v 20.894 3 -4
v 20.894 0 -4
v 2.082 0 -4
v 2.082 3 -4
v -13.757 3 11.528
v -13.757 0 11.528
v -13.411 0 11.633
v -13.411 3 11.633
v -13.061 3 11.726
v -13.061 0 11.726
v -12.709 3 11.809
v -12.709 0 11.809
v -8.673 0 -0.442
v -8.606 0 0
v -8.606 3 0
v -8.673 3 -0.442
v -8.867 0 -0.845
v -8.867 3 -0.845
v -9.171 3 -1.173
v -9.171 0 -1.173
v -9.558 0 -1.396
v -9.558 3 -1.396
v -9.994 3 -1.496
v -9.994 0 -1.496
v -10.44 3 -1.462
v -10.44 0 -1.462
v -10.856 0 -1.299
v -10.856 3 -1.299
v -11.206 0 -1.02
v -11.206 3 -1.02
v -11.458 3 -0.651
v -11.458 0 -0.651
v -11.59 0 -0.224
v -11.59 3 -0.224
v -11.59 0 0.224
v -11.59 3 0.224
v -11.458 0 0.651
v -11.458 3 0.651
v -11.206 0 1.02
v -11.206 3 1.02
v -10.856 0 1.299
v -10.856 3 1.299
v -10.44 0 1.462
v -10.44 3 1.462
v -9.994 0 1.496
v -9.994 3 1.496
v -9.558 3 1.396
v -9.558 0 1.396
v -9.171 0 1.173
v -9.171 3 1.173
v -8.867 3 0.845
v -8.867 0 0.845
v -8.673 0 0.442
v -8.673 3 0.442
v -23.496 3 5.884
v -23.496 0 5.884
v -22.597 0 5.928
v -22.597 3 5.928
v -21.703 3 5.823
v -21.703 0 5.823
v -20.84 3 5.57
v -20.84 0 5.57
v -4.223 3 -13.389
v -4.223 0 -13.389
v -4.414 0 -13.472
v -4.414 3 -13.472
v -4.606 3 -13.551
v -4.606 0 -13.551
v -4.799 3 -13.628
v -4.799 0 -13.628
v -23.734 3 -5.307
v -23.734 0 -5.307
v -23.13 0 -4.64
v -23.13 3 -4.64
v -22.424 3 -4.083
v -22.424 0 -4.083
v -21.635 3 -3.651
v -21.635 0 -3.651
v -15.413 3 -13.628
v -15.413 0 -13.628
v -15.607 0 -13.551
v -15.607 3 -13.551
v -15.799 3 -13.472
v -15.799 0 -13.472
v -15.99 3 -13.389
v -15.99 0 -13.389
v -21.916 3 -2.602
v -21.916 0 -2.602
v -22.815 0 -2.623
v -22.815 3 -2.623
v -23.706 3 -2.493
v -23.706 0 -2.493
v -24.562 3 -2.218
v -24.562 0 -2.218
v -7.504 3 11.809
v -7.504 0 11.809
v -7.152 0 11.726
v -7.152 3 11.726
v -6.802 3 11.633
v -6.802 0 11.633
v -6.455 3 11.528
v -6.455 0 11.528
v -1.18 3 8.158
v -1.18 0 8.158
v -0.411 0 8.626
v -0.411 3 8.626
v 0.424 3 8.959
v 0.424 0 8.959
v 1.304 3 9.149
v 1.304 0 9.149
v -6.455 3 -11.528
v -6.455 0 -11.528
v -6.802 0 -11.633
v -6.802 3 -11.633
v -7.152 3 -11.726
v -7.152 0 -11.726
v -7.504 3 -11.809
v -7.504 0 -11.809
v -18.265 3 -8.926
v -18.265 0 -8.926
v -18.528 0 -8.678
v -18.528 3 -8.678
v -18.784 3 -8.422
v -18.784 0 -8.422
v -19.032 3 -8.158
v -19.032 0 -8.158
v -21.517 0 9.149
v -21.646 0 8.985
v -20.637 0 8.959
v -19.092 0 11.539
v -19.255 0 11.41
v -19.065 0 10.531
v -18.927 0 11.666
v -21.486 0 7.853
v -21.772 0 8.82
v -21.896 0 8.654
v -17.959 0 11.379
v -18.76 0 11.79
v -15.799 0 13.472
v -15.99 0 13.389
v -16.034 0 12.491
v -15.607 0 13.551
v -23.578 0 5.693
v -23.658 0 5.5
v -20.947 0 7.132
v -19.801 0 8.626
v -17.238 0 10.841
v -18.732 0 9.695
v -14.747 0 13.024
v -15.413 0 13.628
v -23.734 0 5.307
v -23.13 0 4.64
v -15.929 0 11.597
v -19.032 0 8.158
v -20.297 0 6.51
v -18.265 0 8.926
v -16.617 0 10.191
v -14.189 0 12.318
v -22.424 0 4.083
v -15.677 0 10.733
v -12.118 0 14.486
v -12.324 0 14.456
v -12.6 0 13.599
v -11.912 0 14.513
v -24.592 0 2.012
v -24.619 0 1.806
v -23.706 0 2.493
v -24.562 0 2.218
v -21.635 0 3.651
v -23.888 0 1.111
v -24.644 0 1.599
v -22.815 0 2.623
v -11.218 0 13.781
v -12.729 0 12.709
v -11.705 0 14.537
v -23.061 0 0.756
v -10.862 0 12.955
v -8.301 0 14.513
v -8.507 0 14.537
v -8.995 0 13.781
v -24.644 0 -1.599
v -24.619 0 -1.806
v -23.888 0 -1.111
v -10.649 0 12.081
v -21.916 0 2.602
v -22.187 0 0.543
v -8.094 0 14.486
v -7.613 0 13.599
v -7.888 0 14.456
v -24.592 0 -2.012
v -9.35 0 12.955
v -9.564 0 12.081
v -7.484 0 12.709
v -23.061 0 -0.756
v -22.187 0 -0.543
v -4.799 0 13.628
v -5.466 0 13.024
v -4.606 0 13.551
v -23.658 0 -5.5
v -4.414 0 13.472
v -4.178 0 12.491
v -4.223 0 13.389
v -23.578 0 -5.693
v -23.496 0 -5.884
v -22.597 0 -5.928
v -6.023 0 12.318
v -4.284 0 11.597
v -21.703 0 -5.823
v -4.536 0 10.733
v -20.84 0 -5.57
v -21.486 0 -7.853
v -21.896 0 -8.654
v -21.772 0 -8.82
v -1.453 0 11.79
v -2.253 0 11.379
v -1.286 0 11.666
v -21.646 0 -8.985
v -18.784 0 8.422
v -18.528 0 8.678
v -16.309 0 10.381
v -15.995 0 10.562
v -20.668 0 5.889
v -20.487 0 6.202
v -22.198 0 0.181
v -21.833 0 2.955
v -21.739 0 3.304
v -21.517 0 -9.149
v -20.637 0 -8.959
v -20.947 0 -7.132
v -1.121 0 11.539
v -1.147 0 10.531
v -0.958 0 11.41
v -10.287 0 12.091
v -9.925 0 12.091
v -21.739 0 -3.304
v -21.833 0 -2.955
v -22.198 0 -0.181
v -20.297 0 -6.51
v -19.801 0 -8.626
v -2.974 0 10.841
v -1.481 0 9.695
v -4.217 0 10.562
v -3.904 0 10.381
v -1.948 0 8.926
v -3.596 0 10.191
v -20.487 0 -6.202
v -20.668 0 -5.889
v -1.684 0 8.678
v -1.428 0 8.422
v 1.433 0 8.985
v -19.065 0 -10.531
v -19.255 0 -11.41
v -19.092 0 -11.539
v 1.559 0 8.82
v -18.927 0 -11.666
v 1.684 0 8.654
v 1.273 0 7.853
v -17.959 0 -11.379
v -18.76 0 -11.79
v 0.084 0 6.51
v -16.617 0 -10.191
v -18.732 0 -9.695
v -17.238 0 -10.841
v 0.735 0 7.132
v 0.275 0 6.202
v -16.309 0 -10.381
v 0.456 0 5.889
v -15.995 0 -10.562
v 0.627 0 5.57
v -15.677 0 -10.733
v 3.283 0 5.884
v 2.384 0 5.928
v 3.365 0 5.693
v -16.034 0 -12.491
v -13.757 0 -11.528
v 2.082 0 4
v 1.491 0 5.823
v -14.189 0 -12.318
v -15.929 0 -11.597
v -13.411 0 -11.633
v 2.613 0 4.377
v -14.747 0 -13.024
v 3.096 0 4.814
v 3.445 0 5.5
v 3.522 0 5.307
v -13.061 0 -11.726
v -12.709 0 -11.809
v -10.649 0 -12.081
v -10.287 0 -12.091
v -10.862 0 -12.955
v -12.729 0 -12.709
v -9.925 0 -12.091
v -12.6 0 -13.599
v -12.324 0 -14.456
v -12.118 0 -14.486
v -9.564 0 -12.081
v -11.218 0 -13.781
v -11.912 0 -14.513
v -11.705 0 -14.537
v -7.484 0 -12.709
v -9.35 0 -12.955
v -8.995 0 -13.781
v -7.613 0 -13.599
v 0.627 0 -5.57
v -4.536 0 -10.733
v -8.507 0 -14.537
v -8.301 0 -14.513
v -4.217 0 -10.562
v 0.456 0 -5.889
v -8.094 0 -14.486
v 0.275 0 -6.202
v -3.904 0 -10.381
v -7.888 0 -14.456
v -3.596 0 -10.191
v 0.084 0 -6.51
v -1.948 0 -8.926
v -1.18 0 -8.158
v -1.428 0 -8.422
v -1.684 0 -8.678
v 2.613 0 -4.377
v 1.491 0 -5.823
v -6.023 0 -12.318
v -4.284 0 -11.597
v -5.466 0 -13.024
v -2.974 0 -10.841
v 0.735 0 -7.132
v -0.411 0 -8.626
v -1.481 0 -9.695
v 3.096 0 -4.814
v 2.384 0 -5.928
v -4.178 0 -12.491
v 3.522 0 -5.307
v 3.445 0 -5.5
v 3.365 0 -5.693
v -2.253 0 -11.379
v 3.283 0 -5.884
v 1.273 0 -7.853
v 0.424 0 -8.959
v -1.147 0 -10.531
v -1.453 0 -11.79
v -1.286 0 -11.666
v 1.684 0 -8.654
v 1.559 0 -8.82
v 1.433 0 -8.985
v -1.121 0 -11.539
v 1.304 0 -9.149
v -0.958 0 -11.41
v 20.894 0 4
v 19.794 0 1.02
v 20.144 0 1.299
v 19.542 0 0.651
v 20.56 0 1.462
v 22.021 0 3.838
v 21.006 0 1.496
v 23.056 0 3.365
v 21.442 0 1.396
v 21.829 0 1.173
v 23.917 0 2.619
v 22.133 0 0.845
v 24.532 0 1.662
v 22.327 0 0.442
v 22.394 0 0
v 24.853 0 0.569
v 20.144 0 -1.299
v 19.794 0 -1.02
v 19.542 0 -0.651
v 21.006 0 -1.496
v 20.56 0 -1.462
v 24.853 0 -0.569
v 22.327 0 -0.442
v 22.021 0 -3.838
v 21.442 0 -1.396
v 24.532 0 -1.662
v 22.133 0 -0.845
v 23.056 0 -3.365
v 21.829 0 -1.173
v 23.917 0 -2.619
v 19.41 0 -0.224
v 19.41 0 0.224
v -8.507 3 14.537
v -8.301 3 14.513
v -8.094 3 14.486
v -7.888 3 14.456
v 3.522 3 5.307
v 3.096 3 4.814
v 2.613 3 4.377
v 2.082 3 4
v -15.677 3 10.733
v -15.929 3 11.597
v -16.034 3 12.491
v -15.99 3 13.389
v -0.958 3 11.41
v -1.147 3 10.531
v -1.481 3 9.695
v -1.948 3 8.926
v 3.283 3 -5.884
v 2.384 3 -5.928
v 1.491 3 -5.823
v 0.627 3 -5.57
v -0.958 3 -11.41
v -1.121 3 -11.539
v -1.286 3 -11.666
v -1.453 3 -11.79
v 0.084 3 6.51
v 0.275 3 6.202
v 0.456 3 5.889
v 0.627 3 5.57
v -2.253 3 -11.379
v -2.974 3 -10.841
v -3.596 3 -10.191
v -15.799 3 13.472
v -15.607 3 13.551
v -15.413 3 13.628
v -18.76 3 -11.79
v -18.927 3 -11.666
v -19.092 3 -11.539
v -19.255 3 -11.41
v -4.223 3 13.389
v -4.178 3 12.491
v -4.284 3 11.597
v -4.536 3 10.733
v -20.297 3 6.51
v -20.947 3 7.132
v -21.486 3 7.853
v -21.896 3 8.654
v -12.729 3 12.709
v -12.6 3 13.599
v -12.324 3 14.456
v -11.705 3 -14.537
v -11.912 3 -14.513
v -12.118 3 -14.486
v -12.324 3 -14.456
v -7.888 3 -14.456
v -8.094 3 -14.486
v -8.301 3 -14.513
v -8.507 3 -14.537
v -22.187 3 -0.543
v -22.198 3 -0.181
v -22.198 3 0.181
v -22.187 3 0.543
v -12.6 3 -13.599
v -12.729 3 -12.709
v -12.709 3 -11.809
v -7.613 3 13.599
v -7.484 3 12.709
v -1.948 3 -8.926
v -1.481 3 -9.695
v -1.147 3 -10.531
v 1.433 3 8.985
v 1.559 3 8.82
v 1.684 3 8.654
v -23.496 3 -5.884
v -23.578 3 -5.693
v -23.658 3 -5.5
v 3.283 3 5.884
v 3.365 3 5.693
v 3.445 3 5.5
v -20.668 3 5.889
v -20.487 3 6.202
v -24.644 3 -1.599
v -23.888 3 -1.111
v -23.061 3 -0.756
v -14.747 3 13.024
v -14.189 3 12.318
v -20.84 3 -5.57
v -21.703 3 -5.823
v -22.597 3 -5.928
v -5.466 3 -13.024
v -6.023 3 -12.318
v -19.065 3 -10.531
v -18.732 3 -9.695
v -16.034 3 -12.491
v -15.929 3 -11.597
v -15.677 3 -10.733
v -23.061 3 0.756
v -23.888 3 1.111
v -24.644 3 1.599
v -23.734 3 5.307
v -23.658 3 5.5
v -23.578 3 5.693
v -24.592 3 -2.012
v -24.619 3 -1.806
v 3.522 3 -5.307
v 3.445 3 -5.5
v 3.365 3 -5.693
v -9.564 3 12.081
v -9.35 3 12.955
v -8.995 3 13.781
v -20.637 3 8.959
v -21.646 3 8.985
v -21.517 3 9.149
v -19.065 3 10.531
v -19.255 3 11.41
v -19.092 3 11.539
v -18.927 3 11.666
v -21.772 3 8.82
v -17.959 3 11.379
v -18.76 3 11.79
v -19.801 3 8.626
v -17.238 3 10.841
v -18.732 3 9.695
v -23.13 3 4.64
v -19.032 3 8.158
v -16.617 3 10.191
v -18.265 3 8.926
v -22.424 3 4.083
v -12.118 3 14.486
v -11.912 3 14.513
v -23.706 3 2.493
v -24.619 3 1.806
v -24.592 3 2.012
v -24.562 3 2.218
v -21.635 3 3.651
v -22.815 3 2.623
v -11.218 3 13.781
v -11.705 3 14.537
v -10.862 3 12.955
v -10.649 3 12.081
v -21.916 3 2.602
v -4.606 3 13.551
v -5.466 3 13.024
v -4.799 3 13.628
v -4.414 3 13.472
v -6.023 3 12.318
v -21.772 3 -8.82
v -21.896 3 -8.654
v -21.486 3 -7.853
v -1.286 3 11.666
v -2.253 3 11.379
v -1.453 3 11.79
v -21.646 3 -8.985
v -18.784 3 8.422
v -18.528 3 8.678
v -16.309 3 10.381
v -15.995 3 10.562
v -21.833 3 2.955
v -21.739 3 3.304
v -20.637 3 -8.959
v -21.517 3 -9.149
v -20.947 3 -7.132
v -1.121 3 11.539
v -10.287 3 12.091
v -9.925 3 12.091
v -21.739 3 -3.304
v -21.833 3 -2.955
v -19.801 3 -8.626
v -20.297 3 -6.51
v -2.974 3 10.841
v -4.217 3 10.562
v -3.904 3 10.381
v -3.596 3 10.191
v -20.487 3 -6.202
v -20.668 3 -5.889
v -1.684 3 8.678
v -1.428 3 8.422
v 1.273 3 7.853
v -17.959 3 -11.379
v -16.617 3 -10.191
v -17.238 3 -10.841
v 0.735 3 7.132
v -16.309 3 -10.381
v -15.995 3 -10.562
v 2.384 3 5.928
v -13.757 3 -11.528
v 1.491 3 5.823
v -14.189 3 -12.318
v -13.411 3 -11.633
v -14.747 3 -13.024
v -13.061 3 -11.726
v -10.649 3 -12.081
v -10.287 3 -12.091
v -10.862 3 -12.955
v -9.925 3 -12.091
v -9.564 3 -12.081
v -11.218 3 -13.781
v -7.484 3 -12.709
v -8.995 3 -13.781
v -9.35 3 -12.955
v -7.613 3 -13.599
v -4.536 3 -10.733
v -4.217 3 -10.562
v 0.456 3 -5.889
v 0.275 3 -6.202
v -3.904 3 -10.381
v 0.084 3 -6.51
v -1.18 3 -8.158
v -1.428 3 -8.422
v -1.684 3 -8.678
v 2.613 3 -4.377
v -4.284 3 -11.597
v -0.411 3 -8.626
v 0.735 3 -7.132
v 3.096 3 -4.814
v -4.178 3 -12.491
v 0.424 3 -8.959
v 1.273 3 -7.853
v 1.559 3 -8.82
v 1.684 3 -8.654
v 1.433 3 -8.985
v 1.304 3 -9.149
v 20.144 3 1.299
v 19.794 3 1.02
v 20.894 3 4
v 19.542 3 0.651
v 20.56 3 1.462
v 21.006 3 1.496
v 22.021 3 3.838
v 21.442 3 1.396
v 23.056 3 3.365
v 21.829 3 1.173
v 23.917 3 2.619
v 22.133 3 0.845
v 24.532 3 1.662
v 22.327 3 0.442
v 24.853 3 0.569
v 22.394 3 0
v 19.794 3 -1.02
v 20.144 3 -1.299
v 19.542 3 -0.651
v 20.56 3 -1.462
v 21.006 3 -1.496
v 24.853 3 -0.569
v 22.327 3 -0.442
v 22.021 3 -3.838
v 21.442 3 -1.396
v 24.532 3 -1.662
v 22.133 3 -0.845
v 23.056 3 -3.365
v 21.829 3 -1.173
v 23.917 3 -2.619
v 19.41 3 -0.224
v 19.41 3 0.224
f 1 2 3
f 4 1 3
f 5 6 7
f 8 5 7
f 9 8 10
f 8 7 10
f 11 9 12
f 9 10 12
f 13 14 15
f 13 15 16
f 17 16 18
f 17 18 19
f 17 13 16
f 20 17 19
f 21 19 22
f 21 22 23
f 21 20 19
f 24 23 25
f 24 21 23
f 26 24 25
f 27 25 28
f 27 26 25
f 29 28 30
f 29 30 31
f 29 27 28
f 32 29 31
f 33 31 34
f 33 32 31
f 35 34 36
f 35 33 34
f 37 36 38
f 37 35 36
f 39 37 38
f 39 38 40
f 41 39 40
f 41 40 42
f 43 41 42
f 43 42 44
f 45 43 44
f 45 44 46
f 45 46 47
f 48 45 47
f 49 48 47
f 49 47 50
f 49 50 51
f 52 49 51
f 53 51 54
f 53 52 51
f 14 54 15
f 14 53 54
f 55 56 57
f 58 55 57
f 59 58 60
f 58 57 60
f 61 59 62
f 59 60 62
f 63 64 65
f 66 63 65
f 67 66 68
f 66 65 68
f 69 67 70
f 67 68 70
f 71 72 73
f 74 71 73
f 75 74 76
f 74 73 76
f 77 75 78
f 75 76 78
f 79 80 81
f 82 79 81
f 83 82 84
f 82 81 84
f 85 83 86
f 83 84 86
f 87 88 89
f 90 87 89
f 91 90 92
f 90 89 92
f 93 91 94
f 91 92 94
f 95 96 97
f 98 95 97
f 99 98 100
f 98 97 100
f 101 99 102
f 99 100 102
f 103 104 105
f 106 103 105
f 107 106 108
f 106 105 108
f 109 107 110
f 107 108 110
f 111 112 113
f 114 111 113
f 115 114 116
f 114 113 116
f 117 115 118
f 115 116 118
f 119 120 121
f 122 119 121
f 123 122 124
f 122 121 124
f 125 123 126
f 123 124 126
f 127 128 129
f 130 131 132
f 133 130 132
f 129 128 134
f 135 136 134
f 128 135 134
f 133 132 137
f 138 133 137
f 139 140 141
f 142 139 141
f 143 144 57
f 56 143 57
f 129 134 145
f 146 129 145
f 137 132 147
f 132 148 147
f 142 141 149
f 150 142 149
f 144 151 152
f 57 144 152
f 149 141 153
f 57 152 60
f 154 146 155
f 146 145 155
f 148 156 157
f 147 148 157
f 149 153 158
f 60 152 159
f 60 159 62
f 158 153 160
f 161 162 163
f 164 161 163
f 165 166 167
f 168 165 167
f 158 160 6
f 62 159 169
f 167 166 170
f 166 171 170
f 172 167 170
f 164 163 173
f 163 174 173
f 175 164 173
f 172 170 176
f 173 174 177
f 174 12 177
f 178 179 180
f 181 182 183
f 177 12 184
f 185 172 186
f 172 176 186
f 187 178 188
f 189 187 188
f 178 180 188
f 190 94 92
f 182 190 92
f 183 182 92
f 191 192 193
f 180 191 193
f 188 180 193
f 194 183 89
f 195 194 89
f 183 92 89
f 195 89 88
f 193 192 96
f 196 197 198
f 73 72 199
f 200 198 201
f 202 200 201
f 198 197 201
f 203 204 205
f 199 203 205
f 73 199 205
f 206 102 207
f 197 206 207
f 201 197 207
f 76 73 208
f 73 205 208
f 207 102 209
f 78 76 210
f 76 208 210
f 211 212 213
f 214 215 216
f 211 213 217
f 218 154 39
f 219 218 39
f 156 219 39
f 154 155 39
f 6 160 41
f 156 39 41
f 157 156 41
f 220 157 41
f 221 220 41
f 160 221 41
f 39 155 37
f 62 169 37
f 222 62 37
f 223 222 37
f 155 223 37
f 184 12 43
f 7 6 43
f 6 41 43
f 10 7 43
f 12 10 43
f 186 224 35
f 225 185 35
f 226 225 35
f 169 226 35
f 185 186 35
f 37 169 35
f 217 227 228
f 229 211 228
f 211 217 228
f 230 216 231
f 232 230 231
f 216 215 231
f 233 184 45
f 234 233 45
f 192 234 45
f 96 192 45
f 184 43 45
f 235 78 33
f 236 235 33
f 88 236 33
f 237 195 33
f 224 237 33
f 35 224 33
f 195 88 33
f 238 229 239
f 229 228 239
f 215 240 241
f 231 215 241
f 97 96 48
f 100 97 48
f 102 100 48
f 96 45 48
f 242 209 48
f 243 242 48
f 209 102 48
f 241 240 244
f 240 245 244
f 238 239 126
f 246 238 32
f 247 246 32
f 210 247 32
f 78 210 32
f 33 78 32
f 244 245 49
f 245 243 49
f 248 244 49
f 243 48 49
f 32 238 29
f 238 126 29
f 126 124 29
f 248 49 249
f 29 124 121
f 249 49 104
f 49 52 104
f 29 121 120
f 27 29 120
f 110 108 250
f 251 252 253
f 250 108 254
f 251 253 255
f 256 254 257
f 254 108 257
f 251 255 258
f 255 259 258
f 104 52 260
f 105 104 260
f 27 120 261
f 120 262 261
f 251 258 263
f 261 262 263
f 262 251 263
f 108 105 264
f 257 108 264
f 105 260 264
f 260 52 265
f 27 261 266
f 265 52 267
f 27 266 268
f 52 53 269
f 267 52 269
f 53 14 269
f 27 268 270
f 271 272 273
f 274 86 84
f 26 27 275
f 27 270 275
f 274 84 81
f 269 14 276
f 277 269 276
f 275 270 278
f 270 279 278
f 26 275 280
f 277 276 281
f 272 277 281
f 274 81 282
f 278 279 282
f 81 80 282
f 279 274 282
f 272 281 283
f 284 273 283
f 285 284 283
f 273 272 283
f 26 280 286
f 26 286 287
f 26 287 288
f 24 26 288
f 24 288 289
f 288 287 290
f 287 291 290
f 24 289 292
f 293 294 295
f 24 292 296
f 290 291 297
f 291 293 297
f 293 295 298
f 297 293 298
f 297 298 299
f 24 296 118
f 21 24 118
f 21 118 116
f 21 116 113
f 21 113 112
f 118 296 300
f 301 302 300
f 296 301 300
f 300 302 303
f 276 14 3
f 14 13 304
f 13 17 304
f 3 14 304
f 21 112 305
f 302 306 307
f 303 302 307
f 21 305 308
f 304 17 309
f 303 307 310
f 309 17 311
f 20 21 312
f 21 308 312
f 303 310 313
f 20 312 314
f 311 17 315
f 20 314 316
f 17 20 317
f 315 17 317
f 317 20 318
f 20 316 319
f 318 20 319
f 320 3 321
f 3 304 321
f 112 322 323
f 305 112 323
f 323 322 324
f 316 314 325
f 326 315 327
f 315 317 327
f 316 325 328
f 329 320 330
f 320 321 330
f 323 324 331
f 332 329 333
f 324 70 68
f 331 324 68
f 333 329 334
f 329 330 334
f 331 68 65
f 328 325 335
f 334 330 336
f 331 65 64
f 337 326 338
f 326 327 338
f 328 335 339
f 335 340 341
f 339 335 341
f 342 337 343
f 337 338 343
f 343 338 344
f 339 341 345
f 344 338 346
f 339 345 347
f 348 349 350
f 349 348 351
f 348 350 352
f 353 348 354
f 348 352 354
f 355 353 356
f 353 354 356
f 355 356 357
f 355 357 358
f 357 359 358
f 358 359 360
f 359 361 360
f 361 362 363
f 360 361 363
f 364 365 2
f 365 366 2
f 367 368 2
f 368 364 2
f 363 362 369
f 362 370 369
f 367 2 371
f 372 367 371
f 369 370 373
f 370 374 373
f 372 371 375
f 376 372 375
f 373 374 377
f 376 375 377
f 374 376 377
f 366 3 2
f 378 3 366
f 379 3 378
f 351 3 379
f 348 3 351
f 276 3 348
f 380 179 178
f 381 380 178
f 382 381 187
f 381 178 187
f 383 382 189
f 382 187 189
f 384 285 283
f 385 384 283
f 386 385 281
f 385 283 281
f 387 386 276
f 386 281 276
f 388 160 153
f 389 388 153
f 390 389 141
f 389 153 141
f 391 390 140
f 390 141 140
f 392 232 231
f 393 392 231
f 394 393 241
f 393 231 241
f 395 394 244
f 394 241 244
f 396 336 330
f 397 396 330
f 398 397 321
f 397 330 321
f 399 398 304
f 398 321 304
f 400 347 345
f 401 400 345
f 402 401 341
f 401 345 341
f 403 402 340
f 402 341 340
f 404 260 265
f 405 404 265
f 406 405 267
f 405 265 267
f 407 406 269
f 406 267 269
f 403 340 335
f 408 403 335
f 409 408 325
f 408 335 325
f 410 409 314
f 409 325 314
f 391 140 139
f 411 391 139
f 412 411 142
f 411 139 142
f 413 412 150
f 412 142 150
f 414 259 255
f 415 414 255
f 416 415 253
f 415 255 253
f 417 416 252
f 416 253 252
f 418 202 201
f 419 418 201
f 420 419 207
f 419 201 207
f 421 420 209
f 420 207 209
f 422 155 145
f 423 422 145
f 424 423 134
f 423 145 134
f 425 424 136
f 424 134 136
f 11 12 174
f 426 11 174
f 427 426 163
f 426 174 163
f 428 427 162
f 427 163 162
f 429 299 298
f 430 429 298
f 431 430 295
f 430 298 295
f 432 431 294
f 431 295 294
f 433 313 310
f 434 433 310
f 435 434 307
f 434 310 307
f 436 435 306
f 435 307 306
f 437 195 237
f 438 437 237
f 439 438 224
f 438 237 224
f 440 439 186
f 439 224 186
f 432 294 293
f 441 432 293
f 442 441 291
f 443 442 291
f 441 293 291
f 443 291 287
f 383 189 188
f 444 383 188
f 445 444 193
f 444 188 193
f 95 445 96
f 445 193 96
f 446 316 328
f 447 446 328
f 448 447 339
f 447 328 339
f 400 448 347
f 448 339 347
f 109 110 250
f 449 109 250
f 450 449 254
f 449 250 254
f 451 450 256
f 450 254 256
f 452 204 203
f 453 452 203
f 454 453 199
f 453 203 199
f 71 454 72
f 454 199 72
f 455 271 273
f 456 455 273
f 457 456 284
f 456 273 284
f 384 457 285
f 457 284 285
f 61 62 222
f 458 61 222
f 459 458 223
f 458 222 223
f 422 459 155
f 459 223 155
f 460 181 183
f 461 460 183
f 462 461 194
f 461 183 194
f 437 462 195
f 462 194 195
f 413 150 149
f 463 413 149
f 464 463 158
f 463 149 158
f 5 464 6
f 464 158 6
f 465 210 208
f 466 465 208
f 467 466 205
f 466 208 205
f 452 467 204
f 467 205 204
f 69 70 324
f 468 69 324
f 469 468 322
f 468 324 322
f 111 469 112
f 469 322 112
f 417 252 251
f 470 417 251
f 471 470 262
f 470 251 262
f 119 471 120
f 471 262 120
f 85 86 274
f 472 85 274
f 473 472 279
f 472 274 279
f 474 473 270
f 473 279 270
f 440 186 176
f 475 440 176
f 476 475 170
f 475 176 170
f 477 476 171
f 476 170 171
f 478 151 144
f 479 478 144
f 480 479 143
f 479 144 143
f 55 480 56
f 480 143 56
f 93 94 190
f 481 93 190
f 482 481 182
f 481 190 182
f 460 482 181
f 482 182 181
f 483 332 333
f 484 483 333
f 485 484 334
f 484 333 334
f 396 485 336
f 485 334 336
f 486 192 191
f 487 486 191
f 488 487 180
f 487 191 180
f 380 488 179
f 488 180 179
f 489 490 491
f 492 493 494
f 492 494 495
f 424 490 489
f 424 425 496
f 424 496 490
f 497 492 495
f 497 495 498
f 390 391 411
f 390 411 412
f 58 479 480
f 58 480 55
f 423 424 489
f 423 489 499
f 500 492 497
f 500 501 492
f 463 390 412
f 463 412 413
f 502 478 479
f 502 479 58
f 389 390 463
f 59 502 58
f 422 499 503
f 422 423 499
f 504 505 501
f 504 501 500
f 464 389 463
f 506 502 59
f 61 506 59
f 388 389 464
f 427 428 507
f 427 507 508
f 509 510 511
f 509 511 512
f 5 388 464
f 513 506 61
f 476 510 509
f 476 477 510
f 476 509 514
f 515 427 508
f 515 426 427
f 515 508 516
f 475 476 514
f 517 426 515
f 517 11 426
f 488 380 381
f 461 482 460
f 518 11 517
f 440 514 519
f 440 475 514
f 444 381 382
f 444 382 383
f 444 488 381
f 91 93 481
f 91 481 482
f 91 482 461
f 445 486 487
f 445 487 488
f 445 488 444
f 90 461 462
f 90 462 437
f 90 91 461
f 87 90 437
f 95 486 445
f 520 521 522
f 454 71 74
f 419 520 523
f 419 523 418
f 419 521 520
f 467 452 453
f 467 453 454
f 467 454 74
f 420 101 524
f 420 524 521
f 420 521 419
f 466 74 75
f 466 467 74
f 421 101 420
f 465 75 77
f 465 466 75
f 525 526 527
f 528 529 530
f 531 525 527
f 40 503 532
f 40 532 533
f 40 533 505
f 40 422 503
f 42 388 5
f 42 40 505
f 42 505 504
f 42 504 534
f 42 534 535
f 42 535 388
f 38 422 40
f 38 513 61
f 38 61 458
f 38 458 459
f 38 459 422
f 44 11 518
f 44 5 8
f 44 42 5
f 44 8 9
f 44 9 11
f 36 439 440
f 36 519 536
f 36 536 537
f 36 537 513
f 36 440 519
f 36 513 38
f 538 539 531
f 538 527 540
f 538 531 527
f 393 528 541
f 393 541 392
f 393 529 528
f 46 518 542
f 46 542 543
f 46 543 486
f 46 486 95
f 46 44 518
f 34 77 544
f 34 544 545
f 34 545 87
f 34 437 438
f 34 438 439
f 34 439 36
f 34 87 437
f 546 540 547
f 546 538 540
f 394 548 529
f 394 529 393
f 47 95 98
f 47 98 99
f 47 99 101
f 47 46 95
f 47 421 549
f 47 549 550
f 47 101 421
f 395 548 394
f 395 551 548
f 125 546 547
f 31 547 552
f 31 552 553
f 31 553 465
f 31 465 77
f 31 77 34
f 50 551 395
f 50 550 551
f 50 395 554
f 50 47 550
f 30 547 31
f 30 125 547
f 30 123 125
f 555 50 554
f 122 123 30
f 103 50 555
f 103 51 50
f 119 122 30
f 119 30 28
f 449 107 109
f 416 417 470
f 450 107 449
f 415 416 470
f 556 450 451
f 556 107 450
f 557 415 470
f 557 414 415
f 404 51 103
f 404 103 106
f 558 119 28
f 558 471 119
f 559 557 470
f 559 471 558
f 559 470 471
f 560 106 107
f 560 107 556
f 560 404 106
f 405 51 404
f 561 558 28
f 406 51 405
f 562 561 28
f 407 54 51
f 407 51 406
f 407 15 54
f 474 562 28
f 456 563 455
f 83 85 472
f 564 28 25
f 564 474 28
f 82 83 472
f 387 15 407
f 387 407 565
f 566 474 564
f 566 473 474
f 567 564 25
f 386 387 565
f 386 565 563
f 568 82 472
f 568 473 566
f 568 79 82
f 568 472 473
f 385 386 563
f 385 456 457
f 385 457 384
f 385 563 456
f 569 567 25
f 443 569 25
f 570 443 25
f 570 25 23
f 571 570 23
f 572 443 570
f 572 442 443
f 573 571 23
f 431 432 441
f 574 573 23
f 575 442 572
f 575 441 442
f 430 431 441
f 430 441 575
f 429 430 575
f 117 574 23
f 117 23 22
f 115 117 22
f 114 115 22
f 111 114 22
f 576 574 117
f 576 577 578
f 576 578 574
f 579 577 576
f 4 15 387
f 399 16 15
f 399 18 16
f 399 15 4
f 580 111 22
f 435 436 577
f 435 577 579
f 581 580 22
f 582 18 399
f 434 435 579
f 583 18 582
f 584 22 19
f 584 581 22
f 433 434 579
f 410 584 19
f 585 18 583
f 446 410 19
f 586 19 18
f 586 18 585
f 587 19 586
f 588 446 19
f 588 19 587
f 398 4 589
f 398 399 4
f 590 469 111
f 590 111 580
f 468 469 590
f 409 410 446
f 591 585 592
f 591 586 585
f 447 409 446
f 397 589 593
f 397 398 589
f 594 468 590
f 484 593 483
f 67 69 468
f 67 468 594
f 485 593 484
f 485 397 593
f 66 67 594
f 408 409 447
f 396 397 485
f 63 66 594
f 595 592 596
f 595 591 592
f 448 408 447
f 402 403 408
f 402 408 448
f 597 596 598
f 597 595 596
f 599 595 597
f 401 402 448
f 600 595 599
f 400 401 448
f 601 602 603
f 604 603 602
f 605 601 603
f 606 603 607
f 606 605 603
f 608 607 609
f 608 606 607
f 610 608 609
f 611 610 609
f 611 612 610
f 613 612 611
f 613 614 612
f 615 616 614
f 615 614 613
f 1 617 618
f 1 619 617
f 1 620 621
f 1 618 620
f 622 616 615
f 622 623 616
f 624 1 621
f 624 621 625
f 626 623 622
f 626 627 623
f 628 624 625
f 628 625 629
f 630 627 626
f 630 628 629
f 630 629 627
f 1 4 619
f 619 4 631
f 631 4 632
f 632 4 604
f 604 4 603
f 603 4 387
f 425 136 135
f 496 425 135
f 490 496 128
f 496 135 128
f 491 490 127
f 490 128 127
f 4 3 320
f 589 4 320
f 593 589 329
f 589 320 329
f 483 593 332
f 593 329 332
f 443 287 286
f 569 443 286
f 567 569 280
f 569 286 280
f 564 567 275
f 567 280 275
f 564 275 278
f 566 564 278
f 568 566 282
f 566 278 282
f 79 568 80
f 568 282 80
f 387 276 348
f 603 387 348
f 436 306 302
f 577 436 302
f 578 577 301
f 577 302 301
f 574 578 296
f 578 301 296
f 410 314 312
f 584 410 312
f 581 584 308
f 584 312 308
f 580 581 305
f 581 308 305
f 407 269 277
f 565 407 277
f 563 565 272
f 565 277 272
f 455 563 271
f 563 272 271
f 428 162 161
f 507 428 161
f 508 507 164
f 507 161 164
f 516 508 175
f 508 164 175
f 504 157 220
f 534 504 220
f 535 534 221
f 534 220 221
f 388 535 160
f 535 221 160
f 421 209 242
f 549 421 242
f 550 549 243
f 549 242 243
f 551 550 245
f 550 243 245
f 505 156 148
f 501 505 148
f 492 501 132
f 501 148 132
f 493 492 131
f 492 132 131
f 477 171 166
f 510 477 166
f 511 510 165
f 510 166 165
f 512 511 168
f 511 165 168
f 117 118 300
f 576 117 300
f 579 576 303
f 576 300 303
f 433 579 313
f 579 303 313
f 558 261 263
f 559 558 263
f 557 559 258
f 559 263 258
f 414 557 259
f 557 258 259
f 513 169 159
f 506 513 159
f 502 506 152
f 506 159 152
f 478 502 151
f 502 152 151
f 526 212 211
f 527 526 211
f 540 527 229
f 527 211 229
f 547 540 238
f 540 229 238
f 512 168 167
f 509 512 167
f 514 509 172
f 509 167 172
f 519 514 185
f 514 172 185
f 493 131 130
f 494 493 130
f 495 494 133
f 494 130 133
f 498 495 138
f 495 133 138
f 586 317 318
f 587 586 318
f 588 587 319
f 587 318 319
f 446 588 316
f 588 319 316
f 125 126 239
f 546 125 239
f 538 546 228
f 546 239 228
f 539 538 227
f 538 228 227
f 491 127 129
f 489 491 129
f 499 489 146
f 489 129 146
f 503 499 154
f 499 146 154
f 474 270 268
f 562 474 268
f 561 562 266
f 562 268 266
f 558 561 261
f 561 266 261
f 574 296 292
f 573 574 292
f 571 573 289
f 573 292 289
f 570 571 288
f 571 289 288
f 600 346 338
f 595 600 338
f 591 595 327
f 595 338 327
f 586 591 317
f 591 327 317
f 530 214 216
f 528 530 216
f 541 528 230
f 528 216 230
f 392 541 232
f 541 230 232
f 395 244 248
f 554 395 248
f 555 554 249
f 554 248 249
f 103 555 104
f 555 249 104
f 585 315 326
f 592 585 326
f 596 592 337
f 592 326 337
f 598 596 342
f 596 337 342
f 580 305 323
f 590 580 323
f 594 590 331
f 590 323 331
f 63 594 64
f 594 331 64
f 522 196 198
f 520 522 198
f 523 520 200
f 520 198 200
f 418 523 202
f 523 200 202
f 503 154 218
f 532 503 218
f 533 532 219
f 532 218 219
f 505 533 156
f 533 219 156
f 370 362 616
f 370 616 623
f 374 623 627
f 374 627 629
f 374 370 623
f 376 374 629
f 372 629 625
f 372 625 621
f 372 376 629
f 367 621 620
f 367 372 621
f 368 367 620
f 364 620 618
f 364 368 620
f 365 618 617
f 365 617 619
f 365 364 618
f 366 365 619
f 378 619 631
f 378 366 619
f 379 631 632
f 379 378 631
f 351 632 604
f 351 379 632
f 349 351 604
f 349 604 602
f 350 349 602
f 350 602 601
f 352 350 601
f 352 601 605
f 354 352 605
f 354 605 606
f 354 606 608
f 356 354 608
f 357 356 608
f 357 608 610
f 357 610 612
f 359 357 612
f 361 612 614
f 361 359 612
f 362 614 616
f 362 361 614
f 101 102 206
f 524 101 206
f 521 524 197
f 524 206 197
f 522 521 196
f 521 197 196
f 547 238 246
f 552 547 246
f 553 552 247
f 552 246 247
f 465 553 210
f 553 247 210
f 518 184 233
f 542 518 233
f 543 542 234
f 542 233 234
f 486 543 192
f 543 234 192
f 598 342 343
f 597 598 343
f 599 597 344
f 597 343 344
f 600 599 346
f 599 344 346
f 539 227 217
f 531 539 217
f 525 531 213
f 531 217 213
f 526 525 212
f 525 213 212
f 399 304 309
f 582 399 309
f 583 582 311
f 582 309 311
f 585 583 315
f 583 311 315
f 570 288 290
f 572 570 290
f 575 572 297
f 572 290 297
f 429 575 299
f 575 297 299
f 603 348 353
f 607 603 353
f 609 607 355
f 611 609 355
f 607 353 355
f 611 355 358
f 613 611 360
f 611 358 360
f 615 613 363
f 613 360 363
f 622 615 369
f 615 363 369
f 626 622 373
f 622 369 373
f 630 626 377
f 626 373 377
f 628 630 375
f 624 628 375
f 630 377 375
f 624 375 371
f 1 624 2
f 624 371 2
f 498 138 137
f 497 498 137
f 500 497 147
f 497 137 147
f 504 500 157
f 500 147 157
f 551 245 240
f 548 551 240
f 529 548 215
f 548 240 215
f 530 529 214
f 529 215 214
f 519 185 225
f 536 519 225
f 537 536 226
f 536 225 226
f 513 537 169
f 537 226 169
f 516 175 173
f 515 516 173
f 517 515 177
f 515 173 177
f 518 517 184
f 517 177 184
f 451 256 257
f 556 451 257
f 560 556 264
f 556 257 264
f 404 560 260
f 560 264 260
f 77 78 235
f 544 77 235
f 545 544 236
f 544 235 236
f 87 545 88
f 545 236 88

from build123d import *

# Parameters (mm, degrees)
SKETCH1_R           = 1.5
BOSS_EXTRUDE1_DEPTH = 3


with BuildPart() as part:
    # Sketch1 → Boss-Extrude1 (new body)
    with BuildSketch(Plane(origin=(0, 0, 0), x_dir=(1, 0, 0), z_dir=(0, 1, 0))):
        with BuildLine():
            Line((20.893657446, 4), (2.081641936, 4))
            ThreePointArc((2.081641936, 4), (2.861028333, 4.588201733), (3.521749436, 5.30713988))
            ThreePointArc((3.521749436, 5.30713988), (3.405395609, 5.596745198), (3.282888305, 5.883801663))
            ThreePointArc((3.282888305, 5.883801663), (1.93527598, 5.894040025), (0.627094961, 5.57027124))
            ThreePointArc((0.627094961, 5.57027124), (0.366286148, 6.046375), (0.084372603, 6.510293938))
            ThreePointArc((0.084372603, 6.510293938), (1.018855105, 7.48132754), (1.683794586, 8.65351323))
            ThreePointArc((1.683794586, 8.65351323), (1.496450048, 8.903135899), (1.303821399, 9.148703928))
            ThreePointArc((1.303821399, 9.148703928), (-0.000522033, 8.809805691), (-1.180330337, 8.158486898))
            ThreePointArc((-1.180330337, 8.158486898), (-1.555477026, 8.550865528), (-1.947855656, 8.926012217))
            ThreePointArc((-1.947855656, 8.926012217), (-1.296536862, 10.105820521), (-0.957638625, 11.410163953))
            ThreePointArc((-0.957638625, 11.410163953), (-1.203206655, 11.602792602), (-1.452829324, 11.79013714))
            ThreePointArc((-1.452829324, 11.79013714), (-2.625015014, 11.125197659), (-3.596048616, 10.190715157))
            ThreePointArc((-3.596048616, 10.190715157), (-4.059967554, 10.472628702), (-4.536071314, 10.733437515))
            ThreePointArc((-4.536071314, 10.733437515), (-4.212302529, 12.041618533), (-4.222540891, 13.389230859))
            ThreePointArc((-4.222540891, 13.389230859), (-4.509597355, 13.511738163), (-4.799202674, 13.62809199))
            ThreePointArc((-4.799202674, 13.62809199), (-5.759348103, 12.682425791), (-6.455432668, 11.528463019))
            ThreePointArc((-6.455432668, 11.528463019), (-6.976508546, 11.680699536), (-7.503891752, 11.809396783))
            ThreePointArc((-7.503891752, 11.809396783), (-7.529737283, 13.156800143), (-7.888414517, 14.455843809))
            ThreePointArc((-7.888414517, 14.455843809), (-8.197396993, 14.499881098), (-8.507248835, 14.537314892))
            ThreePointArc((-8.507248835, 14.537314892), (-9.18992168, 13.375367565), (-9.563620196, 12.080565177))
            ThreePointArc((-9.563620196, 12.080565177), (-10.106342554, 12.09275), (-10.649064912, 12.080565177))
            ThreePointArc((-10.649064912, 12.080565177), (-11.022763428, 13.375367565), (-11.705436272, 14.537314892))
            ThreePointArc((-11.705436272, 14.537314892), (-12.015288115, 14.499881098), (-12.324270591, 14.455843809))
            ThreePointArc((-12.324270591, 14.455843809), (-12.682947825, 13.156800143), (-12.708793355, 11.809396783))
            ThreePointArc((-12.708793355, 11.809396783), (-13.236176561, 11.680699536), (-13.757252439, 11.528463019))
            ThreePointArc((-13.757252439, 11.528463019), (-14.453337005, 12.682425791), (-15.413482434, 13.62809199))
            ThreePointArc((-15.413482434, 13.62809199), (-15.703087752, 13.511738163), (-15.990144217, 13.389230859))
            ThreePointArc((-15.990144217, 13.389230859), (-16.000382579, 12.041618533), (-15.676613793, 10.733437515))
            ThreePointArc((-15.676613793, 10.733437515), (-16.152717554, 10.472628702), (-16.616636492, 10.190715157))
            ThreePointArc((-16.616636492, 10.190715157), (-17.587670094, 11.125197659), (-18.759855783, 11.79013714))
            ThreePointArc((-18.759855783, 11.79013714), (-19.009478453, 11.602792602), (-19.255046482, 11.410163953))
            ThreePointArc((-19.255046482, 11.410163953), (-18.916148245, 10.105820521), (-18.264829452, 8.926012217))
            ThreePointArc((-18.264829452, 8.926012217), (-18.657208082, 8.550865528), (-19.032354771, 8.158486898))
            ThreePointArc((-19.032354771, 8.158486898), (-20.212163074, 8.809805691), (-21.516506507, 9.148703928))
            ThreePointArc((-21.516506507, 9.148703928), (-21.709135156, 8.903135899), (-21.896479694, 8.65351323))
            ThreePointArc((-21.896479694, 8.65351323), (-21.231540213, 7.48132754), (-20.297057711, 6.510293938))
            ThreePointArc((-20.297057711, 6.510293938), (-20.578971255, 6.046375), (-20.839780068, 5.57027124))
            ThreePointArc((-20.839780068, 5.57027124), (-22.147961087, 5.894040025), (-23.495573413, 5.883801663))
            ThreePointArc((-23.495573413, 5.883801663), (-23.618080717, 5.596745198), (-23.734434544, 5.30713988))
            ThreePointArc((-23.734434544, 5.30713988), (-22.788768345, 4.346994451), (-21.634805572, 3.650909885))
            ThreePointArc((-21.634805572, 3.650909885), (-21.78704209, 3.129834008), (-21.915739337, 2.602450802))
            ThreePointArc((-21.915739337, 2.602450802), (-23.263142697, 2.576605271), (-24.562186363, 2.217928037))
            ThreePointArc((-24.562186363, 2.217928037), (-24.606223651, 1.908945561), (-24.643657446, 1.599093719))
            ThreePointArc((-24.643657446, 1.599093719), (-23.481710119, 0.916420874), (-22.186907731, 0.542722358))
            ThreePointArc((-22.186907731, 0.542722358), (-22.199092554, 0), (-22.186907731, -0.542722358))
            ThreePointArc((-22.186907731, -0.542722358), (-23.481710119, -0.916420874), (-24.643657446, -1.599093719))
            ThreePointArc((-24.643657446, -1.599093719), (-24.606223651, -1.908945561), (-24.562186363, -2.217928037))
            ThreePointArc((-24.562186363, -2.217928037), (-23.263142697, -2.576605271), (-21.915739337, -2.602450802))
            ThreePointArc((-21.915739337, -2.602450802), (-21.78704209, -3.129834008), (-21.634805572, -3.650909885))
            ThreePointArc((-21.634805572, -3.650909885), (-22.788768345, -4.346994451), (-23.734434544, -5.30713988))
            ThreePointArc((-23.734434544, -5.30713988), (-23.618080717, -5.596745198), (-23.495573413, -5.883801663))
            ThreePointArc((-23.495573413, -5.883801663), (-22.147961087, -5.894040025), (-20.839780068, -5.57027124))
            ThreePointArc((-20.839780068, -5.57027124), (-20.578971255, -6.046375), (-20.297057711, -6.510293938))
            ThreePointArc((-20.297057711, -6.510293938), (-21.231540213, -7.48132754), (-21.896479694, -8.65351323))
            ThreePointArc((-21.896479694, -8.65351323), (-21.709135156, -8.903135899), (-21.516506507, -9.148703928))
            ThreePointArc((-21.516506507, -9.148703928), (-20.212163074, -8.809805691), (-19.032354771, -8.158486898))
            ThreePointArc((-19.032354771, -8.158486898), (-18.657208082, -8.550865528), (-18.264829452, -8.926012217))
            ThreePointArc((-18.264829452, -8.926012217), (-18.916148245, -10.105820521), (-19.255046482, -11.410163953))
            ThreePointArc((-19.255046482, -11.410163953), (-19.009478453, -11.602792602), (-18.759855783, -11.79013714))
            ThreePointArc((-18.759855783, -11.79013714), (-17.587670094, -11.125197659), (-16.616636492, -10.190715157))
            ThreePointArc((-16.616636492, -10.190715157), (-16.152717554, -10.472628702), (-15.676613793, -10.733437515))
            ThreePointArc((-15.676613793, -10.733437515), (-16.000382579, -12.041618533), (-15.990144217, -13.389230859))
            ThreePointArc((-15.990144217, -13.389230859), (-15.703087752, -13.511738163), (-15.413482434, -13.62809199))
            ThreePointArc((-15.413482434, -13.62809199), (-14.453337005, -12.682425791), (-13.757252439, -11.528463019))
            ThreePointArc((-13.757252439, -11.528463019), (-13.236176561, -11.680699536), (-12.708793355, -11.809396783))
            ThreePointArc((-12.708793355, -11.809396783), (-12.682947825, -13.156800143), (-12.324270591, -14.455843809))
            ThreePointArc((-12.324270591, -14.455843809), (-12.015288115, -14.499881098), (-11.705436272, -14.537314892))
            ThreePointArc((-11.705436272, -14.537314892), (-11.022763428, -13.375367565), (-10.649064912, -12.080565177))
            ThreePointArc((-10.649064912, -12.080565177), (-10.106342554, -12.09275), (-9.563620196, -12.080565177))
            ThreePointArc((-9.563620196, -12.080565177), (-9.18992168, -13.375367565), (-8.507248835, -14.537314892))
            ThreePointArc((-8.507248835, -14.537314892), (-8.197396993, -14.499881098), (-7.888414517, -14.455843809))
            ThreePointArc((-7.888414517, -14.455843809), (-7.529737283, -13.156800143), (-7.503891752, -11.809396783))
            ThreePointArc((-7.503891752, -11.809396783), (-6.976508546, -11.680699536), (-6.455432668, -11.528463019))
            ThreePointArc((-6.455432668, -11.528463019), (-5.759348103, -12.682425791), (-4.799202674, -13.62809199))
            ThreePointArc((-4.799202674, -13.62809199), (-4.509597355, -13.511738163), (-4.222540891, -13.389230859))
            ThreePointArc((-4.222540891, -13.389230859), (-4.212302529, -12.041618533), (-4.536071314, -10.733437515))
            ThreePointArc((-4.536071314, -10.733437515), (-4.059967554, -10.472628702), (-3.596048616, -10.190715157))
            ThreePointArc((-3.596048616, -10.190715157), (-2.625015014, -11.125197659), (-1.452829324, -11.79013714))
            ThreePointArc((-1.452829324, -11.79013714), (-1.203206655, -11.602792602), (-0.957638625, -11.410163953))
            ThreePointArc((-0.957638625, -11.410163953), (-1.296536862, -10.105820521), (-1.947855656, -8.926012217))
            ThreePointArc((-1.947855656, -8.926012217), (-1.555477026, -8.550865528), (-1.180330337, -8.158486898))
            ThreePointArc((-1.180330337, -8.158486898), (-0.000522033, -8.809805691), (1.303821399, -9.148703928))
            ThreePointArc((1.303821399, -9.148703928), (1.496450048, -8.903135899), (1.683794586, -8.65351323))
            ThreePointArc((1.683794586, -8.65351323), (1.018855105, -7.48132754), (0.084372603, -6.510293938))
            ThreePointArc((0.084372603, -6.510293938), (0.366286148, -6.046375), (0.627094961, -5.57027124))
            ThreePointArc((0.627094961, -5.57027124), (1.93527598, -5.894040025), (3.282888305, -5.883801663))
            ThreePointArc((3.282888305, -5.883801663), (3.405395609, -5.596745198), (3.521749436, -5.30713988))
            ThreePointArc((3.521749436, -5.30713988), (2.861028333, -4.588201733), (2.081641936, -4))
            Line((2.081641936, -4), (20.893657446, -4))
            ThreePointArc((20.893657446, -4), (24.893657446, 0), (20.893657446, 4))
        make_face()
        with Locations((-10.106342554, 0)):
            Circle(SKETCH1_R, mode=Mode.SUBTRACT)
        with Locations((20.893657446, 0)):
            Circle(SKETCH1_R, mode=Mode.SUBTRACT)
    extrude(amount=BOSS_EXTRUDE1_DEPTH)


solid = part.part
